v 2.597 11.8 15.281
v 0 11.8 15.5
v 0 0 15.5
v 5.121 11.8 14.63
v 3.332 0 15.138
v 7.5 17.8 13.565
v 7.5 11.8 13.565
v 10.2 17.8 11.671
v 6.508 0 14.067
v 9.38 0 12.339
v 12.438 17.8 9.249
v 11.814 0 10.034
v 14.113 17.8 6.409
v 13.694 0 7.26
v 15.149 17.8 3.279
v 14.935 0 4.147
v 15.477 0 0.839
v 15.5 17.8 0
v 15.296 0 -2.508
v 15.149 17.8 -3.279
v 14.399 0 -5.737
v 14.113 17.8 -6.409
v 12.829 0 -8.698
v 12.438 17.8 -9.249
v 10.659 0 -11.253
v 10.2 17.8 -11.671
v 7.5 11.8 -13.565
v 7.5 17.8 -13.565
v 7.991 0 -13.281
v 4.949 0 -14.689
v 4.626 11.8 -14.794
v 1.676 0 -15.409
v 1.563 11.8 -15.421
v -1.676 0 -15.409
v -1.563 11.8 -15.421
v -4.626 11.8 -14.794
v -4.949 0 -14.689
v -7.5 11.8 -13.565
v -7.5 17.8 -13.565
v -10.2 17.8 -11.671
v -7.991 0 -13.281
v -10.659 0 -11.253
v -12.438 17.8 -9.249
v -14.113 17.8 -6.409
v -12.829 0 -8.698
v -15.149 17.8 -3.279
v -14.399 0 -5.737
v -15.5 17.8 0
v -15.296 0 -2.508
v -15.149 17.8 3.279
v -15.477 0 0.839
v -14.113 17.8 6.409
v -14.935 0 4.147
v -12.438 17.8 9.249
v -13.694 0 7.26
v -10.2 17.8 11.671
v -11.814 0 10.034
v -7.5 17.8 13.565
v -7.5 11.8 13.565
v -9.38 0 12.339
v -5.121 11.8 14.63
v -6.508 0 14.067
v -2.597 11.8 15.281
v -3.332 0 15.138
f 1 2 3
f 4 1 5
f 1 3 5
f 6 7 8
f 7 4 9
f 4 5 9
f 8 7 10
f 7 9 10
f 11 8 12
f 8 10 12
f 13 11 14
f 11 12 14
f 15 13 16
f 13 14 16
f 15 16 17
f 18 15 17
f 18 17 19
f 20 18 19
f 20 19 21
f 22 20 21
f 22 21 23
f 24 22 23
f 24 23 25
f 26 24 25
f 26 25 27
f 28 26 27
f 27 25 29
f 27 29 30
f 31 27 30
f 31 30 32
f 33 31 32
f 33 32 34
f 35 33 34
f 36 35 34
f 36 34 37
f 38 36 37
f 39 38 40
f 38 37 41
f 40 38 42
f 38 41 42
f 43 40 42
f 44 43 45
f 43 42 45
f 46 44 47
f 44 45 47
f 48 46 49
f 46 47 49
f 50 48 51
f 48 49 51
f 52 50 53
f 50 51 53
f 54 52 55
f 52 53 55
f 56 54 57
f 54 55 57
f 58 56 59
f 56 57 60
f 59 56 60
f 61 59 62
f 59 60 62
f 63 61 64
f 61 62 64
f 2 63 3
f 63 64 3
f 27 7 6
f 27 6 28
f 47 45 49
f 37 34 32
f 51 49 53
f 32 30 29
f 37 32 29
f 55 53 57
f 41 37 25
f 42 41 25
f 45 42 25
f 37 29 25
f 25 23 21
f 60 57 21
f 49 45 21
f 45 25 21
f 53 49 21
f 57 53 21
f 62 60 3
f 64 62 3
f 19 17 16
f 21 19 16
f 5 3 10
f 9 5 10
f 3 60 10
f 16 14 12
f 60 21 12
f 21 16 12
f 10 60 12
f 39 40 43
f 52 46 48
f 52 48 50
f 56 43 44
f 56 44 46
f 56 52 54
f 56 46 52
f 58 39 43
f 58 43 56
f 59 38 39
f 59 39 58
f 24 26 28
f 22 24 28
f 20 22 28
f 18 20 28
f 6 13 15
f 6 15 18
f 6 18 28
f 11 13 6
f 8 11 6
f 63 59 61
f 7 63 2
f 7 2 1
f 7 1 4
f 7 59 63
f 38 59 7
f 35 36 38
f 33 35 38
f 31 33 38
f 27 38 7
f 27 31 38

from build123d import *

# Parameters (mm, degrees)
SKETCH_1_R          = 15.5
EXTRUDE_1_DEPTH     = 17.8
CUT_EXTRUDE_START   = -6
CUT_EXTRUDE_1_DEPTH = 6


with BuildPart() as part:
    # 草图1 → 凸台-拉伸1 (new body)
    with BuildSketch(Plane(origin=(0, 0, 0), x_dir=(1, 0, 0), z_dir=(0, 1, 0))):
        with Locations(Location((0, 0, 0), (0, 0, 270))):
            Circle(SKETCH_1_R)
    extrude(amount=EXTRUDE_1_DEPTH)

    # 草图2 → 切除-拉伸1 (cut)
    with BuildSketch(Plane(origin=(0, 17.8, 0), x_dir=(1, 0, 0), z_dir=(0, 1, 0)).offset(CUT_EXTRUDE_START)):
        with BuildLine():
            Line((-7.5, 13.564659966), (-7.5, -13.564659966))
            ThreePointArc((-7.5, -13.564659966), (0, -15.5), (7.5, -13.564659966))
            Line((7.5, -13.564659966), (7.5, 13.564659966))
            ThreePointArc((7.5, 13.564659966), (0, 15.5), (-7.5, 13.564659966))
        make_face()
    extrude(amount=CUT_EXTRUDE_1_DEPTH, mode=Mode.SUBTRACT)


solid = part.part
